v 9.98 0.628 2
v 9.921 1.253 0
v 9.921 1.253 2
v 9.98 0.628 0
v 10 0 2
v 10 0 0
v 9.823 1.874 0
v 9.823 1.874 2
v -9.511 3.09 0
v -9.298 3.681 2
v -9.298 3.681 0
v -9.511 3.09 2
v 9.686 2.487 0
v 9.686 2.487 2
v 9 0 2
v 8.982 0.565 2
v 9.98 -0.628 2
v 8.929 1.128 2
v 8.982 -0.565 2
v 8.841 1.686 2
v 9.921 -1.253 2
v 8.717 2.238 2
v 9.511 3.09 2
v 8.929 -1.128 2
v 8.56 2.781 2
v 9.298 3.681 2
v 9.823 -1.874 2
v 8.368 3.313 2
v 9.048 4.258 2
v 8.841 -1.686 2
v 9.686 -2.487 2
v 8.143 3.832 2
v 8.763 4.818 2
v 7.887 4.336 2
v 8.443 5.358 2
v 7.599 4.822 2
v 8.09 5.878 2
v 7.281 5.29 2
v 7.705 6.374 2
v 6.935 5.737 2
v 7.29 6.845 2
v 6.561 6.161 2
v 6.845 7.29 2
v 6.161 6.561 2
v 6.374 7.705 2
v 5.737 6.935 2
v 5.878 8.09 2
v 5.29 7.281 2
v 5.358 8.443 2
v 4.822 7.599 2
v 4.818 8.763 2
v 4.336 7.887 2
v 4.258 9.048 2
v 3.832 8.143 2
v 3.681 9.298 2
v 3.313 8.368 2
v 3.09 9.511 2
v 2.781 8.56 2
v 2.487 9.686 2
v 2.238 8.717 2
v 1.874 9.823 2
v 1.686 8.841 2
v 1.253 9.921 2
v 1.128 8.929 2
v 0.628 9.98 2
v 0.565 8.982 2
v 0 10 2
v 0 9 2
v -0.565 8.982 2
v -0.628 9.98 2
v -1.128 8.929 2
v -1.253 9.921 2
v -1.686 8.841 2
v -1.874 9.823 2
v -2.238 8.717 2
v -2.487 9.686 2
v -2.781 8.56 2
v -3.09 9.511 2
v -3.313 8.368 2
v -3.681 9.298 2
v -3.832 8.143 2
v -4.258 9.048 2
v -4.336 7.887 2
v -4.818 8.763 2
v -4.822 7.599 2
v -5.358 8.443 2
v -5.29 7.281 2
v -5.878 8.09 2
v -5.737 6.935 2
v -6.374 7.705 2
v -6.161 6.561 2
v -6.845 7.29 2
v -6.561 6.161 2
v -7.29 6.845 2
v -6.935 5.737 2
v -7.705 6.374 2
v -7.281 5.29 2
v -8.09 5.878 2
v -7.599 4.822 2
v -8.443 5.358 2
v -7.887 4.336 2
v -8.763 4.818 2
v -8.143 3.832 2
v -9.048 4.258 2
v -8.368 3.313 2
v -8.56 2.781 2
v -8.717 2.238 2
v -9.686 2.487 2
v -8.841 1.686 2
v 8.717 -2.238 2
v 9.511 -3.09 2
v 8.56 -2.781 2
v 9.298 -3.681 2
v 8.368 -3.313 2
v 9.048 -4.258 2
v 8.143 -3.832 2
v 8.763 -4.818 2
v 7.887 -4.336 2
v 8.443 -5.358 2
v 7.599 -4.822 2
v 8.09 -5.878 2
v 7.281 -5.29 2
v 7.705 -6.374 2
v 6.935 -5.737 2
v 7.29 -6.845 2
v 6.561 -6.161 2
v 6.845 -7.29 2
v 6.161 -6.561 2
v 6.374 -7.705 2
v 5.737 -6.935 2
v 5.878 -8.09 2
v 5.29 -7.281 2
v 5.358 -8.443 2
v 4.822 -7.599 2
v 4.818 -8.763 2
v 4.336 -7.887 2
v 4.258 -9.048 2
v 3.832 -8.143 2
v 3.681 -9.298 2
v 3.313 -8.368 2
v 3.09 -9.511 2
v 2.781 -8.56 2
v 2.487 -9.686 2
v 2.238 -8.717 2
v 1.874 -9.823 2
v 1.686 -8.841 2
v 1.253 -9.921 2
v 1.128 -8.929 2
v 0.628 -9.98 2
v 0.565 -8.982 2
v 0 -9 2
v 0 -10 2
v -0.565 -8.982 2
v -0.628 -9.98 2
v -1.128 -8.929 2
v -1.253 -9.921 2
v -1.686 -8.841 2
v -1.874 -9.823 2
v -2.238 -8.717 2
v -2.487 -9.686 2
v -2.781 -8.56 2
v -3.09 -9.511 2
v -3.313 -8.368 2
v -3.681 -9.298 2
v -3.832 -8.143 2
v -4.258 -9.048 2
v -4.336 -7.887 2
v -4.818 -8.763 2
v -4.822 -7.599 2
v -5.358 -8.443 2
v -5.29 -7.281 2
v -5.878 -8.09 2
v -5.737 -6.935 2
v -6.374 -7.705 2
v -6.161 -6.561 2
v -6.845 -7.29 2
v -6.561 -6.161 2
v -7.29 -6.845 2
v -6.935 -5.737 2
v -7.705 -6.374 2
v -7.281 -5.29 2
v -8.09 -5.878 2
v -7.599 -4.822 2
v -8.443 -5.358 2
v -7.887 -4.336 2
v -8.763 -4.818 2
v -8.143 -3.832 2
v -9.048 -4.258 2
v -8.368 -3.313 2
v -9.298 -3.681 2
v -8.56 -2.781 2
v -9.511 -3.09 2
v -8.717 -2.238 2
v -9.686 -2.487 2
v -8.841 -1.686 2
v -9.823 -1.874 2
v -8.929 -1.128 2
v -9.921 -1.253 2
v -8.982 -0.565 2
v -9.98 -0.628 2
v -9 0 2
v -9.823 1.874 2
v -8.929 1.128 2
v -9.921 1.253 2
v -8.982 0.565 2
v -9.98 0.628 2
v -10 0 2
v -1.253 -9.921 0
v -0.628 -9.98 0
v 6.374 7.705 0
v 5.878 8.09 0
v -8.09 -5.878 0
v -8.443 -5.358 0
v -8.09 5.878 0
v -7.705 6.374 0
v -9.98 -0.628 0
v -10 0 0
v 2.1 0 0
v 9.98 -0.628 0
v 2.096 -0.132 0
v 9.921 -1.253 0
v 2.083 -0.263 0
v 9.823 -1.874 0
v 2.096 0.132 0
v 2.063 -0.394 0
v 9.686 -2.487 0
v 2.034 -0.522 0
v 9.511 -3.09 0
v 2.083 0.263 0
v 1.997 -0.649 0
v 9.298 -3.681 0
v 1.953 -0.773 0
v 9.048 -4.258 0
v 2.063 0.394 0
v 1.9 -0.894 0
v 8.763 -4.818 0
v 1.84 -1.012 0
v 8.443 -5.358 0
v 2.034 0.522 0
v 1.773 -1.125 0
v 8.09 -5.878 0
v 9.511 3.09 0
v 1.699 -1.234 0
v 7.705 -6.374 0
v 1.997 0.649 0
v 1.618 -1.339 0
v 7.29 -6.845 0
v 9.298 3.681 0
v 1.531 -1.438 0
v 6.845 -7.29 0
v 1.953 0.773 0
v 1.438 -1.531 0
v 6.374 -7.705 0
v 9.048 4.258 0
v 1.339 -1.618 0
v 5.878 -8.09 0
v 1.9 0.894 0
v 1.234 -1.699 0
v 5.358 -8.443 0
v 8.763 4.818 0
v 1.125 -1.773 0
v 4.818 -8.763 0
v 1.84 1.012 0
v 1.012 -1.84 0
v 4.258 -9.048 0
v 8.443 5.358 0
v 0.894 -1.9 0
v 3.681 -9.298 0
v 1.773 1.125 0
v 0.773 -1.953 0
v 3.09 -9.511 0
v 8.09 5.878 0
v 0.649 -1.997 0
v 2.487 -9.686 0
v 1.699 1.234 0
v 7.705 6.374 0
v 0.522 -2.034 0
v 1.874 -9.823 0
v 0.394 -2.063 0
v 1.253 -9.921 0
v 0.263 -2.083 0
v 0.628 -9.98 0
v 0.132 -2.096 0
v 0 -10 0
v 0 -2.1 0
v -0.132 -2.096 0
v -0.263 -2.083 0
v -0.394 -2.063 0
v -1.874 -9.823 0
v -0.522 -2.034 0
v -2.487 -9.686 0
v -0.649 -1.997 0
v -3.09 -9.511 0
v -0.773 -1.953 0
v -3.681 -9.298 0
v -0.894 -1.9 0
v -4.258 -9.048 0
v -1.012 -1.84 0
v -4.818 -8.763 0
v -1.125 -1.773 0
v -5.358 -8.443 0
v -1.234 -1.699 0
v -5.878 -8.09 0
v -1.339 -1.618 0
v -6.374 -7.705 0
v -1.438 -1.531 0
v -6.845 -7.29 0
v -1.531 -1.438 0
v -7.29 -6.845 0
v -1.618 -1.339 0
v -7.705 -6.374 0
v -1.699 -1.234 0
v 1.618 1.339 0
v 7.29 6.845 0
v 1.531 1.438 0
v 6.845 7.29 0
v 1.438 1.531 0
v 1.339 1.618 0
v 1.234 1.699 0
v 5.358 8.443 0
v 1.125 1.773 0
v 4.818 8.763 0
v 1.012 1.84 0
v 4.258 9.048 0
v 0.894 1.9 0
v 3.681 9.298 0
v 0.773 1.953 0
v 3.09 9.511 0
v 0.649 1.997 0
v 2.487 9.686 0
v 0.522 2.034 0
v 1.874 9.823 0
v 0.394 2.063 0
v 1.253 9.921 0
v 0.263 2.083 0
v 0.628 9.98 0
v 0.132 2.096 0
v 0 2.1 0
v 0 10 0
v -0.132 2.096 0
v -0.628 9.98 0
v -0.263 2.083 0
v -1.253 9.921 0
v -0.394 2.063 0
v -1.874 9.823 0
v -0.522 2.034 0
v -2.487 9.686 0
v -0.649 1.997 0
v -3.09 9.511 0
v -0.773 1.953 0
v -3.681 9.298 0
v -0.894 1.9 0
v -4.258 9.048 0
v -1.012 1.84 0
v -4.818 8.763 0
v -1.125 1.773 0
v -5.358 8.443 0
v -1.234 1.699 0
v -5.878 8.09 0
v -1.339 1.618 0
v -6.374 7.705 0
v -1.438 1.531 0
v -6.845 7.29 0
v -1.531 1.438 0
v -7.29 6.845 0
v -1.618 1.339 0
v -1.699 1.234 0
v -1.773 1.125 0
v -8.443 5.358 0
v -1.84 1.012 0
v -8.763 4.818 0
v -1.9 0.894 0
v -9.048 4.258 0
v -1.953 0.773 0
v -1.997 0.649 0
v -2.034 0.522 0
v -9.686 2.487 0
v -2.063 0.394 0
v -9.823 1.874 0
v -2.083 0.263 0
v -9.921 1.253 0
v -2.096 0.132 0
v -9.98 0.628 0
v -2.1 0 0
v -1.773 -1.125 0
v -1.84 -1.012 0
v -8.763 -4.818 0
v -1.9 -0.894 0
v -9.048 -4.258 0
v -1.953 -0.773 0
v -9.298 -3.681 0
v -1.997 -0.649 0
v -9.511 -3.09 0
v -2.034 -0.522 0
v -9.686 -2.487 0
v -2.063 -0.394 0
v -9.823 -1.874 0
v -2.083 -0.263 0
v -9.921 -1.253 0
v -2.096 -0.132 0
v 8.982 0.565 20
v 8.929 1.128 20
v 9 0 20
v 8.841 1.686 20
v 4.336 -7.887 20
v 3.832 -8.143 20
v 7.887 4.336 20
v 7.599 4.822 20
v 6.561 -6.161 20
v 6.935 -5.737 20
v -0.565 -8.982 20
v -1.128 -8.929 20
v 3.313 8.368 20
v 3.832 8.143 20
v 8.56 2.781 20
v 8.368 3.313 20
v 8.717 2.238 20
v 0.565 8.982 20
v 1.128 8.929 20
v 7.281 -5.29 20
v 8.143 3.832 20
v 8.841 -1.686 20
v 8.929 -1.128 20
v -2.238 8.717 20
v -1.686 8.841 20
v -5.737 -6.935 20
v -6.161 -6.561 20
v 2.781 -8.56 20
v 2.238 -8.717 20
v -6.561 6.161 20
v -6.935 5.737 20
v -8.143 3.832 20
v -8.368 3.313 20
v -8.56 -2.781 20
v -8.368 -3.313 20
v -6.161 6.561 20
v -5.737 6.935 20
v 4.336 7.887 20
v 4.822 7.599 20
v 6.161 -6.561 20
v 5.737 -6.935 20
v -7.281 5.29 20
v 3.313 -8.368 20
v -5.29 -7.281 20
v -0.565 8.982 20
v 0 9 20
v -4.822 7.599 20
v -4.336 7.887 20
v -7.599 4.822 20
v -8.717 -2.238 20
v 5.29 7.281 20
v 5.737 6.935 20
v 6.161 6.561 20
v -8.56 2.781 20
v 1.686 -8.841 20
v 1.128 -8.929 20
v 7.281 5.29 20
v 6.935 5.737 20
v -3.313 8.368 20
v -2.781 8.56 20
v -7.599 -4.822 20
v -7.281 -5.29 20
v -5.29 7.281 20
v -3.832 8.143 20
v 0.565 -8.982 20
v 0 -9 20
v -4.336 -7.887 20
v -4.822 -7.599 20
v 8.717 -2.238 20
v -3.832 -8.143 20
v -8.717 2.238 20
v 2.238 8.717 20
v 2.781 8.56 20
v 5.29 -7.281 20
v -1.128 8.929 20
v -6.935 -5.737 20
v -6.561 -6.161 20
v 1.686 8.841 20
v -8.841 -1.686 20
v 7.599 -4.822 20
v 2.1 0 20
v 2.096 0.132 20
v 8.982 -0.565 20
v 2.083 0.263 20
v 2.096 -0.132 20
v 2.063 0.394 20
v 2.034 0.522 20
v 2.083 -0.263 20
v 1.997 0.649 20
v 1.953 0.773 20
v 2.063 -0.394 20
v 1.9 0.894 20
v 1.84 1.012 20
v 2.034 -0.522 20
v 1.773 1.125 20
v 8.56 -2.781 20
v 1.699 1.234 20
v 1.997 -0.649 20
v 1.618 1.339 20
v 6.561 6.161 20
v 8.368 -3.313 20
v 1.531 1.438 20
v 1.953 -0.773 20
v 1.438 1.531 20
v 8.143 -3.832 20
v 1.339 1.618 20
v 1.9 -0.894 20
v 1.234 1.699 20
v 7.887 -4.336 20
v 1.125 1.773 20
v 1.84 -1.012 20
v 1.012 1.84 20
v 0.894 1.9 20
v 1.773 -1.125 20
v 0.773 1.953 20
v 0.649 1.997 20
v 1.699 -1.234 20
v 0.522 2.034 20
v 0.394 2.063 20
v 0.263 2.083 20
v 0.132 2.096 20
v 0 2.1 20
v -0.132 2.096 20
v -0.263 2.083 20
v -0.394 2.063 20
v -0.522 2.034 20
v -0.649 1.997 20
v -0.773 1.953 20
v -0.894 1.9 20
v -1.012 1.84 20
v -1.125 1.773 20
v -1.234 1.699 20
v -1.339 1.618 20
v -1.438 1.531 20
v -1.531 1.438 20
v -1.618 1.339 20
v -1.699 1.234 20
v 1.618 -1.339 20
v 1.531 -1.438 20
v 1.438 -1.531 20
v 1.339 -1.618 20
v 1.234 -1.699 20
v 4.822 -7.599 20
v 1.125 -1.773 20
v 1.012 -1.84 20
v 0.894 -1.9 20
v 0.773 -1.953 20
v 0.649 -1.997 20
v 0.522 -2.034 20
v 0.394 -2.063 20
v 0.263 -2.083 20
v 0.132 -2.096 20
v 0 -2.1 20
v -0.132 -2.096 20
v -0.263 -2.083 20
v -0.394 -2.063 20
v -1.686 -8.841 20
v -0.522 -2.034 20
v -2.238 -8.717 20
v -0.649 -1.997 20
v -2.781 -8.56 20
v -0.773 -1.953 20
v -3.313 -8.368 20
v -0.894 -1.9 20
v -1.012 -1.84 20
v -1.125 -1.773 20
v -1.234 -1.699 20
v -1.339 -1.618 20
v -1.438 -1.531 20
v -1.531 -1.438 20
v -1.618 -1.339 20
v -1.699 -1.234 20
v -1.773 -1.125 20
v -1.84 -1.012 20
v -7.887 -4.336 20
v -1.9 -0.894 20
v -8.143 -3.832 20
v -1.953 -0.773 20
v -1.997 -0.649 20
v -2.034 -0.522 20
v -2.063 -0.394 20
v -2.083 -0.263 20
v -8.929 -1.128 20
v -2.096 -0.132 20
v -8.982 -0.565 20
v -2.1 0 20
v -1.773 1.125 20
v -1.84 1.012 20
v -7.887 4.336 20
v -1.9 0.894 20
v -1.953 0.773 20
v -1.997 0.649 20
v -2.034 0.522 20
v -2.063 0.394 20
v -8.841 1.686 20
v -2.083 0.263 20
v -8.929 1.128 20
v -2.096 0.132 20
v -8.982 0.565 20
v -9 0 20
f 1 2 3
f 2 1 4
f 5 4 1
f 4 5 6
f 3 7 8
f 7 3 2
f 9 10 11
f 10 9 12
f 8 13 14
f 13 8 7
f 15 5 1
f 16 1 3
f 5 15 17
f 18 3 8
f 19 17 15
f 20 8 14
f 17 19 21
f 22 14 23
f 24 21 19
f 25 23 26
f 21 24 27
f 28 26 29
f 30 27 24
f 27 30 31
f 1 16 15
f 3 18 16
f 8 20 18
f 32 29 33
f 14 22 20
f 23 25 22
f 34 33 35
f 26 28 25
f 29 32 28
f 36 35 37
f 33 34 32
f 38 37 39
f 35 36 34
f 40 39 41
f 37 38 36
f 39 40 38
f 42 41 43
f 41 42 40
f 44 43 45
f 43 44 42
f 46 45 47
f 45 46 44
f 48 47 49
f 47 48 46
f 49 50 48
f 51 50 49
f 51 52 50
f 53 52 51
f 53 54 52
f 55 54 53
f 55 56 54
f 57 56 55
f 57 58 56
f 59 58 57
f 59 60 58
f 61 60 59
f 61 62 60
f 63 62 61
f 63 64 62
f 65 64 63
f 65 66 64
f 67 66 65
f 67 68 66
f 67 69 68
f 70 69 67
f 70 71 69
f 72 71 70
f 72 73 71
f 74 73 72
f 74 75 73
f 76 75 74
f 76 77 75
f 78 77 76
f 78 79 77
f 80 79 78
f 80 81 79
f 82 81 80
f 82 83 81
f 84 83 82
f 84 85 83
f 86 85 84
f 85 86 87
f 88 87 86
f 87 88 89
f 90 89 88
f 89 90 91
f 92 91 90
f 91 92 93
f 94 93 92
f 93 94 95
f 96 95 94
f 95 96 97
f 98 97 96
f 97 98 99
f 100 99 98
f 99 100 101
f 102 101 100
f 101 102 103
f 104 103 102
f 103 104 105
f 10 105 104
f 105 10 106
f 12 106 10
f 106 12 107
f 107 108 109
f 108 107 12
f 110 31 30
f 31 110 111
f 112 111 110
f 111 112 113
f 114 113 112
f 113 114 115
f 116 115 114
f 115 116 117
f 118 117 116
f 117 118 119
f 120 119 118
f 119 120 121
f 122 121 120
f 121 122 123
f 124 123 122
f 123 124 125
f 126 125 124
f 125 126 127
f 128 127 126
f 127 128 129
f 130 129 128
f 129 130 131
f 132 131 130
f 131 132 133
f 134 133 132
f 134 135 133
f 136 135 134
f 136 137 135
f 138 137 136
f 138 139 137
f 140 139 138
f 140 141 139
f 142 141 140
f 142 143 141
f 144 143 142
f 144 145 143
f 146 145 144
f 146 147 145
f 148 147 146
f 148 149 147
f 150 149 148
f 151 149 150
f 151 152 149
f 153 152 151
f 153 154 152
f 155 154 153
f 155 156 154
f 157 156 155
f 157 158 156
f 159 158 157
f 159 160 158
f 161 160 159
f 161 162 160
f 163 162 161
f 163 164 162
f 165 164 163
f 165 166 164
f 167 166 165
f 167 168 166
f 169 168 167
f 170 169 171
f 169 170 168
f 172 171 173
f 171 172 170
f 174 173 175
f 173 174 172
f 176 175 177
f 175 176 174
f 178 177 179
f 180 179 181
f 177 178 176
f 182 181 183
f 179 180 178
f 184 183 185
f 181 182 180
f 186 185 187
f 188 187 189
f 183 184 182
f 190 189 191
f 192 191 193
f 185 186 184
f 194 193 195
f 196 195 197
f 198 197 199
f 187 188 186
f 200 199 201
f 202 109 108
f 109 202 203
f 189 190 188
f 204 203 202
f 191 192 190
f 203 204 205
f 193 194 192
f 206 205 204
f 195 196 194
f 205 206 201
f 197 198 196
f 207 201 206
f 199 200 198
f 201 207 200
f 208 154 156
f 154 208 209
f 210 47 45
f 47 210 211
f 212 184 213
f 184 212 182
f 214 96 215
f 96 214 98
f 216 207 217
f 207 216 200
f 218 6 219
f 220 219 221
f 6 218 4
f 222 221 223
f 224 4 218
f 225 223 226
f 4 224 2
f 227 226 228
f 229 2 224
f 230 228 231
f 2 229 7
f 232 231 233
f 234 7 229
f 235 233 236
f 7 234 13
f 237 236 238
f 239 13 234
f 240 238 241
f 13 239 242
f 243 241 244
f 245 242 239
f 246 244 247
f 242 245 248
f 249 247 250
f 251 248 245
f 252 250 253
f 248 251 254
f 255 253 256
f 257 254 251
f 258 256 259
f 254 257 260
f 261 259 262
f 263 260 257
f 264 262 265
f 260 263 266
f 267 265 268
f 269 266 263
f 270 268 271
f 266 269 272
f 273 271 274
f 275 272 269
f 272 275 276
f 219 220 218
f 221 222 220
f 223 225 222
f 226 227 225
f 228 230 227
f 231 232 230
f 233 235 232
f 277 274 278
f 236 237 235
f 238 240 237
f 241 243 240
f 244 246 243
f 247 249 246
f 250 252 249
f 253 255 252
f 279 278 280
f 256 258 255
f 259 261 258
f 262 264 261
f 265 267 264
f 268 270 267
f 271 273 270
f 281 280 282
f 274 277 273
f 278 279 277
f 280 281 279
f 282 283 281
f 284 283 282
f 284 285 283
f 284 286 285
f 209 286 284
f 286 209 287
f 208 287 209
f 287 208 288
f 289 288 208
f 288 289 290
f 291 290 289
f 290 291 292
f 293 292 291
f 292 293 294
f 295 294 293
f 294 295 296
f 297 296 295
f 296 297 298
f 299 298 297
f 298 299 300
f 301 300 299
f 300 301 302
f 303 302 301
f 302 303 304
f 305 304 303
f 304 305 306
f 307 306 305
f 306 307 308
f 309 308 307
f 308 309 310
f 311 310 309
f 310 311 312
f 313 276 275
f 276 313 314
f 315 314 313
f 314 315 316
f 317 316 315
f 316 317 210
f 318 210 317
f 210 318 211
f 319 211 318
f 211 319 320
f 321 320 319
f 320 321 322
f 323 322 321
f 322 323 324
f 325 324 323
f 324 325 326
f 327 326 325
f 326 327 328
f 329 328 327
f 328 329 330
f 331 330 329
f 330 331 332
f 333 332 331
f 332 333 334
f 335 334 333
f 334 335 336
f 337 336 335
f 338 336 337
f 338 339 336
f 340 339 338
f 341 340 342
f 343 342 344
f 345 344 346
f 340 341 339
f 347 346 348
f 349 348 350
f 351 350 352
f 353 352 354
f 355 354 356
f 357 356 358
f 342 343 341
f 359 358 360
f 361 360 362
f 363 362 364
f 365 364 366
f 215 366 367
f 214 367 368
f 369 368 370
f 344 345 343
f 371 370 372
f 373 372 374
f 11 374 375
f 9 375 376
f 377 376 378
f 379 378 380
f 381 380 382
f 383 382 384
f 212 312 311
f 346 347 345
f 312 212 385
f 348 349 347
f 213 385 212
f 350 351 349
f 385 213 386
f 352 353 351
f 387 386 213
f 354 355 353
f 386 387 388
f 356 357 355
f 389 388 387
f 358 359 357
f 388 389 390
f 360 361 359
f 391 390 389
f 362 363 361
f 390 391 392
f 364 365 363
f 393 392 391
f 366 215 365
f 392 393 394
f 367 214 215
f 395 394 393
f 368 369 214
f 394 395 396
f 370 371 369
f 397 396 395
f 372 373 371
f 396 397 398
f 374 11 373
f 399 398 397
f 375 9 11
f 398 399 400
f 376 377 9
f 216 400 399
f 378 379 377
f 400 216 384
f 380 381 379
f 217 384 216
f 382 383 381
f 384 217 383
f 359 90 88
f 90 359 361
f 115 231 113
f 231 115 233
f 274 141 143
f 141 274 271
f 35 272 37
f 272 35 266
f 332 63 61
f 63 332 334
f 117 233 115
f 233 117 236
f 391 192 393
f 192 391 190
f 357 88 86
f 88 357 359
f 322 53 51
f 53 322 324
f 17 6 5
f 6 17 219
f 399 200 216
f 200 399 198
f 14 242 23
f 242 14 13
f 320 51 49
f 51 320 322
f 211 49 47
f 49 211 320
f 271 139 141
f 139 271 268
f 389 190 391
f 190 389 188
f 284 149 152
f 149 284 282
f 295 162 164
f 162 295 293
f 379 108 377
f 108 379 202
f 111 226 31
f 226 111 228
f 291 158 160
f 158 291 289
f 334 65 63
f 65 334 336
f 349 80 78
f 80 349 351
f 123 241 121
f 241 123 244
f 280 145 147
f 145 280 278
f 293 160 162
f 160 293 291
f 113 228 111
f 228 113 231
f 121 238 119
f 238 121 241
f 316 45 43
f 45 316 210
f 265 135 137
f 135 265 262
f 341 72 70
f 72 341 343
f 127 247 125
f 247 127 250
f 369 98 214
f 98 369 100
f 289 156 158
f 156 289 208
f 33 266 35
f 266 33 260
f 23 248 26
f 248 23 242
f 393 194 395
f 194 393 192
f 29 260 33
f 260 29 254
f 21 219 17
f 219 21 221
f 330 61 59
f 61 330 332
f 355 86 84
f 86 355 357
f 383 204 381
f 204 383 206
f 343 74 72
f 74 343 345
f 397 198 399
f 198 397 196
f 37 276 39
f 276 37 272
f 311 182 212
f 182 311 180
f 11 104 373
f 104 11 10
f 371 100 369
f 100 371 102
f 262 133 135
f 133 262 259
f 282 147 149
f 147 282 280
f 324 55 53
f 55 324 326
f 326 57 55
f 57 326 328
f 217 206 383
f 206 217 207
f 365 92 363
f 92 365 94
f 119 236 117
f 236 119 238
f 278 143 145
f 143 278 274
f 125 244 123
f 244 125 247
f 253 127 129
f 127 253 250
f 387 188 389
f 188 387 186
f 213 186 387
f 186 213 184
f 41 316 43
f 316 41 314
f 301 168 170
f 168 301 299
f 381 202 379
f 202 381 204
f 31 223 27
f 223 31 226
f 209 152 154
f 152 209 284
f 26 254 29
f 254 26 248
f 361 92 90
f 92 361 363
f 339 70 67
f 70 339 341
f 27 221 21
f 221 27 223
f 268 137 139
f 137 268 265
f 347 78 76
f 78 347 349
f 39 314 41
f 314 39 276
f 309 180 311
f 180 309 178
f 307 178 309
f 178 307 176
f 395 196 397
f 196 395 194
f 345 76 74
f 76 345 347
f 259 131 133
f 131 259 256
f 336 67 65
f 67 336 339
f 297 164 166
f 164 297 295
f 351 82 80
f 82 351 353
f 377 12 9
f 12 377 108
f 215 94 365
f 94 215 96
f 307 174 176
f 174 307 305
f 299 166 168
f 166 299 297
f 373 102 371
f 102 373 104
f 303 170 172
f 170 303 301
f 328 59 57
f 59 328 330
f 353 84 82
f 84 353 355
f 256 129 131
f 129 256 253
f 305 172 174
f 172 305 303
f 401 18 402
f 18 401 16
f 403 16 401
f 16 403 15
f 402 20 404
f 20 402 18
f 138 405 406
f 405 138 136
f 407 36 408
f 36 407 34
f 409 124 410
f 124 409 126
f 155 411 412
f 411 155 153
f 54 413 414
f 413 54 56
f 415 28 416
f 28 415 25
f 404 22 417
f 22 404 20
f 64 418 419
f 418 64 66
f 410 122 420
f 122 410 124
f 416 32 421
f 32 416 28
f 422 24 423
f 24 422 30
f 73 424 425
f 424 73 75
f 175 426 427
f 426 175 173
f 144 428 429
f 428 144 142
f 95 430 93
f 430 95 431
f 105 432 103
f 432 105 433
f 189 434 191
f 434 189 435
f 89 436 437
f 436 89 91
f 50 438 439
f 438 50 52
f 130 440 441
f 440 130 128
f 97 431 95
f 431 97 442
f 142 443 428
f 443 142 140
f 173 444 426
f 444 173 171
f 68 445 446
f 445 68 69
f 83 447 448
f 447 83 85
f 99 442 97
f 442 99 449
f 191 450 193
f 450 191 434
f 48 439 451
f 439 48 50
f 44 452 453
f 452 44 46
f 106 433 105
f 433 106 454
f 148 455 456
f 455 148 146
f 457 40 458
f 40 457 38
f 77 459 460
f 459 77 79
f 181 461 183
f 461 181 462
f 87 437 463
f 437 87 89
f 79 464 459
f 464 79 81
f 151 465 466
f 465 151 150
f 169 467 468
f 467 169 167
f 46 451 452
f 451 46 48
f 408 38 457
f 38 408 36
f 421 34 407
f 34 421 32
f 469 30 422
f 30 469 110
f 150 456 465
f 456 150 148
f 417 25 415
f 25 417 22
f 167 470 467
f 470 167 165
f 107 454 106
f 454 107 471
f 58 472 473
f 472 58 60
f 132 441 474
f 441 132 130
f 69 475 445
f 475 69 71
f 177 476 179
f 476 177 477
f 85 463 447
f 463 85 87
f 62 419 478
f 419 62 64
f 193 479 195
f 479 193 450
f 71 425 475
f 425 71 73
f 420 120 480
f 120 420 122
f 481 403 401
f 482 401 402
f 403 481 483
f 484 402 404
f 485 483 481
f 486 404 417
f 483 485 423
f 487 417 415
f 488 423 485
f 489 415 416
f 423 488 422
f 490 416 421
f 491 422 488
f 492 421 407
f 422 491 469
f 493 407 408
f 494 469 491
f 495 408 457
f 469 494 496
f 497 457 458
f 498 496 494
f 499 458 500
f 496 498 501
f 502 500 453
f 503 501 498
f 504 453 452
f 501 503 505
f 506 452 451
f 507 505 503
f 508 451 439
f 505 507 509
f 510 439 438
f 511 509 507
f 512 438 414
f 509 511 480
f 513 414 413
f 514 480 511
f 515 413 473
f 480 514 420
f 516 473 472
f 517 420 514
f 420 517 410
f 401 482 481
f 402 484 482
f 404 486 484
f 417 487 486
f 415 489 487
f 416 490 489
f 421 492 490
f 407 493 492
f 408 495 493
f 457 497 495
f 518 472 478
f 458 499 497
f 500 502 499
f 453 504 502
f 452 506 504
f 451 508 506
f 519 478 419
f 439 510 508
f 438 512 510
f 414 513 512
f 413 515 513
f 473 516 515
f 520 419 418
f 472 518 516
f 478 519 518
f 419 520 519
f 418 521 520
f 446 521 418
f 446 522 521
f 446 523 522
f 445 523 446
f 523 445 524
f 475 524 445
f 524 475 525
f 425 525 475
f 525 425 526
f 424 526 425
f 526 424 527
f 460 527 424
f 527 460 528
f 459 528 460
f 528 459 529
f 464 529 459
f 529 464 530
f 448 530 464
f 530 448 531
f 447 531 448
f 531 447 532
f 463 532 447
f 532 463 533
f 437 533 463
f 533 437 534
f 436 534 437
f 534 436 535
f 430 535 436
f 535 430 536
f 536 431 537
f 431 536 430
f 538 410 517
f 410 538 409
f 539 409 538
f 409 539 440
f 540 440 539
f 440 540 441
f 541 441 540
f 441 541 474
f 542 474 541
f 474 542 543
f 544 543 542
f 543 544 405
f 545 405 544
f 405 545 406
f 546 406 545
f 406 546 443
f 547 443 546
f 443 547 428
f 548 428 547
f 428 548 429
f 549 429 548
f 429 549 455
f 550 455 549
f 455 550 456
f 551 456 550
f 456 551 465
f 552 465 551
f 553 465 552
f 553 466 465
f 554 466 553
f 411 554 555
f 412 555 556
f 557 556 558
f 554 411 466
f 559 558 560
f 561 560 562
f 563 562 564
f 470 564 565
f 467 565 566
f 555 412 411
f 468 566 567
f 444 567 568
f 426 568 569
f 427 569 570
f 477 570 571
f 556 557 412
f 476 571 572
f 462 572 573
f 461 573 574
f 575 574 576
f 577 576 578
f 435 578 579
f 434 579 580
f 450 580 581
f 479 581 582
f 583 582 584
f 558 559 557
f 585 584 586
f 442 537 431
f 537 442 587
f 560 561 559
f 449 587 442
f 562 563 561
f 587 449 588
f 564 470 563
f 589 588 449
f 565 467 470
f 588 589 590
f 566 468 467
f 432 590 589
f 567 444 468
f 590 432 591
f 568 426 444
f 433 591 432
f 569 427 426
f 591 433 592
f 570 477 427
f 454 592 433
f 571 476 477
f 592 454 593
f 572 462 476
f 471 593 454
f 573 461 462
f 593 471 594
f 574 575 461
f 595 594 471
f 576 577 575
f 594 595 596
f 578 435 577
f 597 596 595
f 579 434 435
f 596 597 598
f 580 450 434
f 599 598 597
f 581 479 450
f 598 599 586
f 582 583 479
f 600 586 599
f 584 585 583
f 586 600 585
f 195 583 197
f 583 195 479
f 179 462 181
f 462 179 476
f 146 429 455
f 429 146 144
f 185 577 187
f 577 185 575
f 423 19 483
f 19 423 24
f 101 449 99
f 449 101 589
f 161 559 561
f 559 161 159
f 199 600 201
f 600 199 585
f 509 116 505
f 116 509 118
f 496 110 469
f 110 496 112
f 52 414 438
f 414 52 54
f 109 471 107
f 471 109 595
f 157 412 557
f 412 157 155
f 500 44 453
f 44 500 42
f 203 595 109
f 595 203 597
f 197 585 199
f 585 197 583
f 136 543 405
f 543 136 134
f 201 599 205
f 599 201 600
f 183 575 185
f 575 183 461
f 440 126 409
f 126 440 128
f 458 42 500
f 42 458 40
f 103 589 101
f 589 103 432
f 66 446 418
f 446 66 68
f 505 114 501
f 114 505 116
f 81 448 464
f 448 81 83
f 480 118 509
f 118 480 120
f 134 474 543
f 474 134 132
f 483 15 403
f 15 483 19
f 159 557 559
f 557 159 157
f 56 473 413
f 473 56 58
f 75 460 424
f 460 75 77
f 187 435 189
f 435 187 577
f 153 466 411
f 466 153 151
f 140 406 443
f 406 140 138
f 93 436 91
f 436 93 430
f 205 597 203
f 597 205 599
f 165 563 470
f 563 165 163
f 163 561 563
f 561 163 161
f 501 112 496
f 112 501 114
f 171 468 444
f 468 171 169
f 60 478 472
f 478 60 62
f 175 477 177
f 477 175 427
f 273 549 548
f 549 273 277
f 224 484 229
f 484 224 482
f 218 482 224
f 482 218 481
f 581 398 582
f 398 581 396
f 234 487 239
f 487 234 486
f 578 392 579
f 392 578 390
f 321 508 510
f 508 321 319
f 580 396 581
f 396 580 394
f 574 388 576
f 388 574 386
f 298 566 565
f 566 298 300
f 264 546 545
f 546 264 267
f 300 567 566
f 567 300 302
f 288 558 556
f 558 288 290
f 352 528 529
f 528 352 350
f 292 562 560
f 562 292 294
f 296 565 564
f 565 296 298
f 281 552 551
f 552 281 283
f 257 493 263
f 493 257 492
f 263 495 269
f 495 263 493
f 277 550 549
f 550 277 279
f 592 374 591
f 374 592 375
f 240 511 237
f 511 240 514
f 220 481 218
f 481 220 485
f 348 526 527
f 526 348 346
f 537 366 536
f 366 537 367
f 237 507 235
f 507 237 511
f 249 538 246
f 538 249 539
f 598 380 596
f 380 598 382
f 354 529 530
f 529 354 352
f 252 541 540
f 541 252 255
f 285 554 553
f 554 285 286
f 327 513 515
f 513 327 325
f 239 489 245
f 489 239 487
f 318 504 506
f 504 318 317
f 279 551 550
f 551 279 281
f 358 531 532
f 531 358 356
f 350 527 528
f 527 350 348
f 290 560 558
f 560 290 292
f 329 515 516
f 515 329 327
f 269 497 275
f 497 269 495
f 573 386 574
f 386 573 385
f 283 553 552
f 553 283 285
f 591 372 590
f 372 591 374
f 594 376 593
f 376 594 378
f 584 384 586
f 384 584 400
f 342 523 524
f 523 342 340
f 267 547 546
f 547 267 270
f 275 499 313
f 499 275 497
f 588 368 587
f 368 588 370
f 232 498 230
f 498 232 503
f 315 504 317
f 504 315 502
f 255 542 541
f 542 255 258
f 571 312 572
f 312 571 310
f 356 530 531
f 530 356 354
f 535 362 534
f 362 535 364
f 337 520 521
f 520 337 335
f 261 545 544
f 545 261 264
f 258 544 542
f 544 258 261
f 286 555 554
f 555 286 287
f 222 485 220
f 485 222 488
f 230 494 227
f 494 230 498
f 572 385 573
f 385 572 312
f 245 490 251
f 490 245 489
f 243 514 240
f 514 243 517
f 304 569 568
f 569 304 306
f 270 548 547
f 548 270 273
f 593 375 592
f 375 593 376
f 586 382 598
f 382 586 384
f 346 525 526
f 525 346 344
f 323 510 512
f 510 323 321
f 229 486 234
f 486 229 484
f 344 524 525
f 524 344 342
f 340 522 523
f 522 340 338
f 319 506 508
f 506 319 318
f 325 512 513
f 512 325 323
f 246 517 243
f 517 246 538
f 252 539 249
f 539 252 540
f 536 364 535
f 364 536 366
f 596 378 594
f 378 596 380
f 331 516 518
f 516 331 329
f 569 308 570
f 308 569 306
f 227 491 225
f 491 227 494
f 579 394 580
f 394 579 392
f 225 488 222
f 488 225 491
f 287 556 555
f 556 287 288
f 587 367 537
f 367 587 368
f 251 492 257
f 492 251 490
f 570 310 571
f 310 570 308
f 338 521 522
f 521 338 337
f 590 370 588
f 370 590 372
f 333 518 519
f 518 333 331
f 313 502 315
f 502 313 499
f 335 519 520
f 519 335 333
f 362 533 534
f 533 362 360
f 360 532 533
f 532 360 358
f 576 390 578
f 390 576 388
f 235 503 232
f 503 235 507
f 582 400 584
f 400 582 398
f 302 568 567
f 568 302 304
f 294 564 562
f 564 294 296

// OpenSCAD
// ====================================================================
// Entretoise pour adaptateur d'alimentation Mean Well LRS-600
// Creality Ender 5 Plus
// ====================================================================
// Auteur: RMonnot
// Licence: MIT
// ====================================================================

// PARAMÈTRES PRINCIPAUX - Modifiez ces valeurs selon vos besoins
hauteur_entretoise = 20;        // Hauteur de l'entretoise (mm)
diametre_trou_vis = 4.2;        // Diamètre du trou pour vis M4 (avec jeu)
diametre_exterieur = 18;        // Diamètre extérieur de l'entretoise
diametre_base = 20;             // Diamètre de la base élargie
hauteur_base = 2;               // Hauteur de la base élargie

// PARAMÈTRES D'IMPRESSION
$fn = 100;                      // Résolution des cercles (plus = plus lisse)

// ====================================================================
// MODULE PRINCIPAL
// ====================================================================

module entretoise() {
    difference() {
        union() {
            // Base élargie pour meilleure stabilité
            cylinder(h = hauteur_base, d = diametre_base);
            
            // Corps principal de l'entretoise
            translate([0, 0, hauteur_base])
            cylinder(h = hauteur_entretoise - hauteur_base, d = diametre_exterieur);
        }
        
        // Trou traversant pour la vis M4
        translate([0, 0, -0.5])
        cylinder(h = hauteur_entretoise + 1, d = diametre_trou_vis);
    }
}

// ====================================================================
// GÉNÉRATION DE L'OBJET
// ====================================================================

entretoise();

// ====================================================================
// NOTES D'UTILISATION
// ====================================================================
// Pour imprimer 4 entretoises, dupliquez ce fichier 4 fois dans votre slicer
// ou modifiez le code ci-dessous pour générer les 4 entretoises ensemble

// Option: Générer 4 entretoises espacées (décommenter pour activer)
/*
spacing = 25;
for (i = [0:1]) {
    for (j = [0:1]) {
        translate([i * spacing, j * spacing, 0])
        entretoise();
    }
}
*/
